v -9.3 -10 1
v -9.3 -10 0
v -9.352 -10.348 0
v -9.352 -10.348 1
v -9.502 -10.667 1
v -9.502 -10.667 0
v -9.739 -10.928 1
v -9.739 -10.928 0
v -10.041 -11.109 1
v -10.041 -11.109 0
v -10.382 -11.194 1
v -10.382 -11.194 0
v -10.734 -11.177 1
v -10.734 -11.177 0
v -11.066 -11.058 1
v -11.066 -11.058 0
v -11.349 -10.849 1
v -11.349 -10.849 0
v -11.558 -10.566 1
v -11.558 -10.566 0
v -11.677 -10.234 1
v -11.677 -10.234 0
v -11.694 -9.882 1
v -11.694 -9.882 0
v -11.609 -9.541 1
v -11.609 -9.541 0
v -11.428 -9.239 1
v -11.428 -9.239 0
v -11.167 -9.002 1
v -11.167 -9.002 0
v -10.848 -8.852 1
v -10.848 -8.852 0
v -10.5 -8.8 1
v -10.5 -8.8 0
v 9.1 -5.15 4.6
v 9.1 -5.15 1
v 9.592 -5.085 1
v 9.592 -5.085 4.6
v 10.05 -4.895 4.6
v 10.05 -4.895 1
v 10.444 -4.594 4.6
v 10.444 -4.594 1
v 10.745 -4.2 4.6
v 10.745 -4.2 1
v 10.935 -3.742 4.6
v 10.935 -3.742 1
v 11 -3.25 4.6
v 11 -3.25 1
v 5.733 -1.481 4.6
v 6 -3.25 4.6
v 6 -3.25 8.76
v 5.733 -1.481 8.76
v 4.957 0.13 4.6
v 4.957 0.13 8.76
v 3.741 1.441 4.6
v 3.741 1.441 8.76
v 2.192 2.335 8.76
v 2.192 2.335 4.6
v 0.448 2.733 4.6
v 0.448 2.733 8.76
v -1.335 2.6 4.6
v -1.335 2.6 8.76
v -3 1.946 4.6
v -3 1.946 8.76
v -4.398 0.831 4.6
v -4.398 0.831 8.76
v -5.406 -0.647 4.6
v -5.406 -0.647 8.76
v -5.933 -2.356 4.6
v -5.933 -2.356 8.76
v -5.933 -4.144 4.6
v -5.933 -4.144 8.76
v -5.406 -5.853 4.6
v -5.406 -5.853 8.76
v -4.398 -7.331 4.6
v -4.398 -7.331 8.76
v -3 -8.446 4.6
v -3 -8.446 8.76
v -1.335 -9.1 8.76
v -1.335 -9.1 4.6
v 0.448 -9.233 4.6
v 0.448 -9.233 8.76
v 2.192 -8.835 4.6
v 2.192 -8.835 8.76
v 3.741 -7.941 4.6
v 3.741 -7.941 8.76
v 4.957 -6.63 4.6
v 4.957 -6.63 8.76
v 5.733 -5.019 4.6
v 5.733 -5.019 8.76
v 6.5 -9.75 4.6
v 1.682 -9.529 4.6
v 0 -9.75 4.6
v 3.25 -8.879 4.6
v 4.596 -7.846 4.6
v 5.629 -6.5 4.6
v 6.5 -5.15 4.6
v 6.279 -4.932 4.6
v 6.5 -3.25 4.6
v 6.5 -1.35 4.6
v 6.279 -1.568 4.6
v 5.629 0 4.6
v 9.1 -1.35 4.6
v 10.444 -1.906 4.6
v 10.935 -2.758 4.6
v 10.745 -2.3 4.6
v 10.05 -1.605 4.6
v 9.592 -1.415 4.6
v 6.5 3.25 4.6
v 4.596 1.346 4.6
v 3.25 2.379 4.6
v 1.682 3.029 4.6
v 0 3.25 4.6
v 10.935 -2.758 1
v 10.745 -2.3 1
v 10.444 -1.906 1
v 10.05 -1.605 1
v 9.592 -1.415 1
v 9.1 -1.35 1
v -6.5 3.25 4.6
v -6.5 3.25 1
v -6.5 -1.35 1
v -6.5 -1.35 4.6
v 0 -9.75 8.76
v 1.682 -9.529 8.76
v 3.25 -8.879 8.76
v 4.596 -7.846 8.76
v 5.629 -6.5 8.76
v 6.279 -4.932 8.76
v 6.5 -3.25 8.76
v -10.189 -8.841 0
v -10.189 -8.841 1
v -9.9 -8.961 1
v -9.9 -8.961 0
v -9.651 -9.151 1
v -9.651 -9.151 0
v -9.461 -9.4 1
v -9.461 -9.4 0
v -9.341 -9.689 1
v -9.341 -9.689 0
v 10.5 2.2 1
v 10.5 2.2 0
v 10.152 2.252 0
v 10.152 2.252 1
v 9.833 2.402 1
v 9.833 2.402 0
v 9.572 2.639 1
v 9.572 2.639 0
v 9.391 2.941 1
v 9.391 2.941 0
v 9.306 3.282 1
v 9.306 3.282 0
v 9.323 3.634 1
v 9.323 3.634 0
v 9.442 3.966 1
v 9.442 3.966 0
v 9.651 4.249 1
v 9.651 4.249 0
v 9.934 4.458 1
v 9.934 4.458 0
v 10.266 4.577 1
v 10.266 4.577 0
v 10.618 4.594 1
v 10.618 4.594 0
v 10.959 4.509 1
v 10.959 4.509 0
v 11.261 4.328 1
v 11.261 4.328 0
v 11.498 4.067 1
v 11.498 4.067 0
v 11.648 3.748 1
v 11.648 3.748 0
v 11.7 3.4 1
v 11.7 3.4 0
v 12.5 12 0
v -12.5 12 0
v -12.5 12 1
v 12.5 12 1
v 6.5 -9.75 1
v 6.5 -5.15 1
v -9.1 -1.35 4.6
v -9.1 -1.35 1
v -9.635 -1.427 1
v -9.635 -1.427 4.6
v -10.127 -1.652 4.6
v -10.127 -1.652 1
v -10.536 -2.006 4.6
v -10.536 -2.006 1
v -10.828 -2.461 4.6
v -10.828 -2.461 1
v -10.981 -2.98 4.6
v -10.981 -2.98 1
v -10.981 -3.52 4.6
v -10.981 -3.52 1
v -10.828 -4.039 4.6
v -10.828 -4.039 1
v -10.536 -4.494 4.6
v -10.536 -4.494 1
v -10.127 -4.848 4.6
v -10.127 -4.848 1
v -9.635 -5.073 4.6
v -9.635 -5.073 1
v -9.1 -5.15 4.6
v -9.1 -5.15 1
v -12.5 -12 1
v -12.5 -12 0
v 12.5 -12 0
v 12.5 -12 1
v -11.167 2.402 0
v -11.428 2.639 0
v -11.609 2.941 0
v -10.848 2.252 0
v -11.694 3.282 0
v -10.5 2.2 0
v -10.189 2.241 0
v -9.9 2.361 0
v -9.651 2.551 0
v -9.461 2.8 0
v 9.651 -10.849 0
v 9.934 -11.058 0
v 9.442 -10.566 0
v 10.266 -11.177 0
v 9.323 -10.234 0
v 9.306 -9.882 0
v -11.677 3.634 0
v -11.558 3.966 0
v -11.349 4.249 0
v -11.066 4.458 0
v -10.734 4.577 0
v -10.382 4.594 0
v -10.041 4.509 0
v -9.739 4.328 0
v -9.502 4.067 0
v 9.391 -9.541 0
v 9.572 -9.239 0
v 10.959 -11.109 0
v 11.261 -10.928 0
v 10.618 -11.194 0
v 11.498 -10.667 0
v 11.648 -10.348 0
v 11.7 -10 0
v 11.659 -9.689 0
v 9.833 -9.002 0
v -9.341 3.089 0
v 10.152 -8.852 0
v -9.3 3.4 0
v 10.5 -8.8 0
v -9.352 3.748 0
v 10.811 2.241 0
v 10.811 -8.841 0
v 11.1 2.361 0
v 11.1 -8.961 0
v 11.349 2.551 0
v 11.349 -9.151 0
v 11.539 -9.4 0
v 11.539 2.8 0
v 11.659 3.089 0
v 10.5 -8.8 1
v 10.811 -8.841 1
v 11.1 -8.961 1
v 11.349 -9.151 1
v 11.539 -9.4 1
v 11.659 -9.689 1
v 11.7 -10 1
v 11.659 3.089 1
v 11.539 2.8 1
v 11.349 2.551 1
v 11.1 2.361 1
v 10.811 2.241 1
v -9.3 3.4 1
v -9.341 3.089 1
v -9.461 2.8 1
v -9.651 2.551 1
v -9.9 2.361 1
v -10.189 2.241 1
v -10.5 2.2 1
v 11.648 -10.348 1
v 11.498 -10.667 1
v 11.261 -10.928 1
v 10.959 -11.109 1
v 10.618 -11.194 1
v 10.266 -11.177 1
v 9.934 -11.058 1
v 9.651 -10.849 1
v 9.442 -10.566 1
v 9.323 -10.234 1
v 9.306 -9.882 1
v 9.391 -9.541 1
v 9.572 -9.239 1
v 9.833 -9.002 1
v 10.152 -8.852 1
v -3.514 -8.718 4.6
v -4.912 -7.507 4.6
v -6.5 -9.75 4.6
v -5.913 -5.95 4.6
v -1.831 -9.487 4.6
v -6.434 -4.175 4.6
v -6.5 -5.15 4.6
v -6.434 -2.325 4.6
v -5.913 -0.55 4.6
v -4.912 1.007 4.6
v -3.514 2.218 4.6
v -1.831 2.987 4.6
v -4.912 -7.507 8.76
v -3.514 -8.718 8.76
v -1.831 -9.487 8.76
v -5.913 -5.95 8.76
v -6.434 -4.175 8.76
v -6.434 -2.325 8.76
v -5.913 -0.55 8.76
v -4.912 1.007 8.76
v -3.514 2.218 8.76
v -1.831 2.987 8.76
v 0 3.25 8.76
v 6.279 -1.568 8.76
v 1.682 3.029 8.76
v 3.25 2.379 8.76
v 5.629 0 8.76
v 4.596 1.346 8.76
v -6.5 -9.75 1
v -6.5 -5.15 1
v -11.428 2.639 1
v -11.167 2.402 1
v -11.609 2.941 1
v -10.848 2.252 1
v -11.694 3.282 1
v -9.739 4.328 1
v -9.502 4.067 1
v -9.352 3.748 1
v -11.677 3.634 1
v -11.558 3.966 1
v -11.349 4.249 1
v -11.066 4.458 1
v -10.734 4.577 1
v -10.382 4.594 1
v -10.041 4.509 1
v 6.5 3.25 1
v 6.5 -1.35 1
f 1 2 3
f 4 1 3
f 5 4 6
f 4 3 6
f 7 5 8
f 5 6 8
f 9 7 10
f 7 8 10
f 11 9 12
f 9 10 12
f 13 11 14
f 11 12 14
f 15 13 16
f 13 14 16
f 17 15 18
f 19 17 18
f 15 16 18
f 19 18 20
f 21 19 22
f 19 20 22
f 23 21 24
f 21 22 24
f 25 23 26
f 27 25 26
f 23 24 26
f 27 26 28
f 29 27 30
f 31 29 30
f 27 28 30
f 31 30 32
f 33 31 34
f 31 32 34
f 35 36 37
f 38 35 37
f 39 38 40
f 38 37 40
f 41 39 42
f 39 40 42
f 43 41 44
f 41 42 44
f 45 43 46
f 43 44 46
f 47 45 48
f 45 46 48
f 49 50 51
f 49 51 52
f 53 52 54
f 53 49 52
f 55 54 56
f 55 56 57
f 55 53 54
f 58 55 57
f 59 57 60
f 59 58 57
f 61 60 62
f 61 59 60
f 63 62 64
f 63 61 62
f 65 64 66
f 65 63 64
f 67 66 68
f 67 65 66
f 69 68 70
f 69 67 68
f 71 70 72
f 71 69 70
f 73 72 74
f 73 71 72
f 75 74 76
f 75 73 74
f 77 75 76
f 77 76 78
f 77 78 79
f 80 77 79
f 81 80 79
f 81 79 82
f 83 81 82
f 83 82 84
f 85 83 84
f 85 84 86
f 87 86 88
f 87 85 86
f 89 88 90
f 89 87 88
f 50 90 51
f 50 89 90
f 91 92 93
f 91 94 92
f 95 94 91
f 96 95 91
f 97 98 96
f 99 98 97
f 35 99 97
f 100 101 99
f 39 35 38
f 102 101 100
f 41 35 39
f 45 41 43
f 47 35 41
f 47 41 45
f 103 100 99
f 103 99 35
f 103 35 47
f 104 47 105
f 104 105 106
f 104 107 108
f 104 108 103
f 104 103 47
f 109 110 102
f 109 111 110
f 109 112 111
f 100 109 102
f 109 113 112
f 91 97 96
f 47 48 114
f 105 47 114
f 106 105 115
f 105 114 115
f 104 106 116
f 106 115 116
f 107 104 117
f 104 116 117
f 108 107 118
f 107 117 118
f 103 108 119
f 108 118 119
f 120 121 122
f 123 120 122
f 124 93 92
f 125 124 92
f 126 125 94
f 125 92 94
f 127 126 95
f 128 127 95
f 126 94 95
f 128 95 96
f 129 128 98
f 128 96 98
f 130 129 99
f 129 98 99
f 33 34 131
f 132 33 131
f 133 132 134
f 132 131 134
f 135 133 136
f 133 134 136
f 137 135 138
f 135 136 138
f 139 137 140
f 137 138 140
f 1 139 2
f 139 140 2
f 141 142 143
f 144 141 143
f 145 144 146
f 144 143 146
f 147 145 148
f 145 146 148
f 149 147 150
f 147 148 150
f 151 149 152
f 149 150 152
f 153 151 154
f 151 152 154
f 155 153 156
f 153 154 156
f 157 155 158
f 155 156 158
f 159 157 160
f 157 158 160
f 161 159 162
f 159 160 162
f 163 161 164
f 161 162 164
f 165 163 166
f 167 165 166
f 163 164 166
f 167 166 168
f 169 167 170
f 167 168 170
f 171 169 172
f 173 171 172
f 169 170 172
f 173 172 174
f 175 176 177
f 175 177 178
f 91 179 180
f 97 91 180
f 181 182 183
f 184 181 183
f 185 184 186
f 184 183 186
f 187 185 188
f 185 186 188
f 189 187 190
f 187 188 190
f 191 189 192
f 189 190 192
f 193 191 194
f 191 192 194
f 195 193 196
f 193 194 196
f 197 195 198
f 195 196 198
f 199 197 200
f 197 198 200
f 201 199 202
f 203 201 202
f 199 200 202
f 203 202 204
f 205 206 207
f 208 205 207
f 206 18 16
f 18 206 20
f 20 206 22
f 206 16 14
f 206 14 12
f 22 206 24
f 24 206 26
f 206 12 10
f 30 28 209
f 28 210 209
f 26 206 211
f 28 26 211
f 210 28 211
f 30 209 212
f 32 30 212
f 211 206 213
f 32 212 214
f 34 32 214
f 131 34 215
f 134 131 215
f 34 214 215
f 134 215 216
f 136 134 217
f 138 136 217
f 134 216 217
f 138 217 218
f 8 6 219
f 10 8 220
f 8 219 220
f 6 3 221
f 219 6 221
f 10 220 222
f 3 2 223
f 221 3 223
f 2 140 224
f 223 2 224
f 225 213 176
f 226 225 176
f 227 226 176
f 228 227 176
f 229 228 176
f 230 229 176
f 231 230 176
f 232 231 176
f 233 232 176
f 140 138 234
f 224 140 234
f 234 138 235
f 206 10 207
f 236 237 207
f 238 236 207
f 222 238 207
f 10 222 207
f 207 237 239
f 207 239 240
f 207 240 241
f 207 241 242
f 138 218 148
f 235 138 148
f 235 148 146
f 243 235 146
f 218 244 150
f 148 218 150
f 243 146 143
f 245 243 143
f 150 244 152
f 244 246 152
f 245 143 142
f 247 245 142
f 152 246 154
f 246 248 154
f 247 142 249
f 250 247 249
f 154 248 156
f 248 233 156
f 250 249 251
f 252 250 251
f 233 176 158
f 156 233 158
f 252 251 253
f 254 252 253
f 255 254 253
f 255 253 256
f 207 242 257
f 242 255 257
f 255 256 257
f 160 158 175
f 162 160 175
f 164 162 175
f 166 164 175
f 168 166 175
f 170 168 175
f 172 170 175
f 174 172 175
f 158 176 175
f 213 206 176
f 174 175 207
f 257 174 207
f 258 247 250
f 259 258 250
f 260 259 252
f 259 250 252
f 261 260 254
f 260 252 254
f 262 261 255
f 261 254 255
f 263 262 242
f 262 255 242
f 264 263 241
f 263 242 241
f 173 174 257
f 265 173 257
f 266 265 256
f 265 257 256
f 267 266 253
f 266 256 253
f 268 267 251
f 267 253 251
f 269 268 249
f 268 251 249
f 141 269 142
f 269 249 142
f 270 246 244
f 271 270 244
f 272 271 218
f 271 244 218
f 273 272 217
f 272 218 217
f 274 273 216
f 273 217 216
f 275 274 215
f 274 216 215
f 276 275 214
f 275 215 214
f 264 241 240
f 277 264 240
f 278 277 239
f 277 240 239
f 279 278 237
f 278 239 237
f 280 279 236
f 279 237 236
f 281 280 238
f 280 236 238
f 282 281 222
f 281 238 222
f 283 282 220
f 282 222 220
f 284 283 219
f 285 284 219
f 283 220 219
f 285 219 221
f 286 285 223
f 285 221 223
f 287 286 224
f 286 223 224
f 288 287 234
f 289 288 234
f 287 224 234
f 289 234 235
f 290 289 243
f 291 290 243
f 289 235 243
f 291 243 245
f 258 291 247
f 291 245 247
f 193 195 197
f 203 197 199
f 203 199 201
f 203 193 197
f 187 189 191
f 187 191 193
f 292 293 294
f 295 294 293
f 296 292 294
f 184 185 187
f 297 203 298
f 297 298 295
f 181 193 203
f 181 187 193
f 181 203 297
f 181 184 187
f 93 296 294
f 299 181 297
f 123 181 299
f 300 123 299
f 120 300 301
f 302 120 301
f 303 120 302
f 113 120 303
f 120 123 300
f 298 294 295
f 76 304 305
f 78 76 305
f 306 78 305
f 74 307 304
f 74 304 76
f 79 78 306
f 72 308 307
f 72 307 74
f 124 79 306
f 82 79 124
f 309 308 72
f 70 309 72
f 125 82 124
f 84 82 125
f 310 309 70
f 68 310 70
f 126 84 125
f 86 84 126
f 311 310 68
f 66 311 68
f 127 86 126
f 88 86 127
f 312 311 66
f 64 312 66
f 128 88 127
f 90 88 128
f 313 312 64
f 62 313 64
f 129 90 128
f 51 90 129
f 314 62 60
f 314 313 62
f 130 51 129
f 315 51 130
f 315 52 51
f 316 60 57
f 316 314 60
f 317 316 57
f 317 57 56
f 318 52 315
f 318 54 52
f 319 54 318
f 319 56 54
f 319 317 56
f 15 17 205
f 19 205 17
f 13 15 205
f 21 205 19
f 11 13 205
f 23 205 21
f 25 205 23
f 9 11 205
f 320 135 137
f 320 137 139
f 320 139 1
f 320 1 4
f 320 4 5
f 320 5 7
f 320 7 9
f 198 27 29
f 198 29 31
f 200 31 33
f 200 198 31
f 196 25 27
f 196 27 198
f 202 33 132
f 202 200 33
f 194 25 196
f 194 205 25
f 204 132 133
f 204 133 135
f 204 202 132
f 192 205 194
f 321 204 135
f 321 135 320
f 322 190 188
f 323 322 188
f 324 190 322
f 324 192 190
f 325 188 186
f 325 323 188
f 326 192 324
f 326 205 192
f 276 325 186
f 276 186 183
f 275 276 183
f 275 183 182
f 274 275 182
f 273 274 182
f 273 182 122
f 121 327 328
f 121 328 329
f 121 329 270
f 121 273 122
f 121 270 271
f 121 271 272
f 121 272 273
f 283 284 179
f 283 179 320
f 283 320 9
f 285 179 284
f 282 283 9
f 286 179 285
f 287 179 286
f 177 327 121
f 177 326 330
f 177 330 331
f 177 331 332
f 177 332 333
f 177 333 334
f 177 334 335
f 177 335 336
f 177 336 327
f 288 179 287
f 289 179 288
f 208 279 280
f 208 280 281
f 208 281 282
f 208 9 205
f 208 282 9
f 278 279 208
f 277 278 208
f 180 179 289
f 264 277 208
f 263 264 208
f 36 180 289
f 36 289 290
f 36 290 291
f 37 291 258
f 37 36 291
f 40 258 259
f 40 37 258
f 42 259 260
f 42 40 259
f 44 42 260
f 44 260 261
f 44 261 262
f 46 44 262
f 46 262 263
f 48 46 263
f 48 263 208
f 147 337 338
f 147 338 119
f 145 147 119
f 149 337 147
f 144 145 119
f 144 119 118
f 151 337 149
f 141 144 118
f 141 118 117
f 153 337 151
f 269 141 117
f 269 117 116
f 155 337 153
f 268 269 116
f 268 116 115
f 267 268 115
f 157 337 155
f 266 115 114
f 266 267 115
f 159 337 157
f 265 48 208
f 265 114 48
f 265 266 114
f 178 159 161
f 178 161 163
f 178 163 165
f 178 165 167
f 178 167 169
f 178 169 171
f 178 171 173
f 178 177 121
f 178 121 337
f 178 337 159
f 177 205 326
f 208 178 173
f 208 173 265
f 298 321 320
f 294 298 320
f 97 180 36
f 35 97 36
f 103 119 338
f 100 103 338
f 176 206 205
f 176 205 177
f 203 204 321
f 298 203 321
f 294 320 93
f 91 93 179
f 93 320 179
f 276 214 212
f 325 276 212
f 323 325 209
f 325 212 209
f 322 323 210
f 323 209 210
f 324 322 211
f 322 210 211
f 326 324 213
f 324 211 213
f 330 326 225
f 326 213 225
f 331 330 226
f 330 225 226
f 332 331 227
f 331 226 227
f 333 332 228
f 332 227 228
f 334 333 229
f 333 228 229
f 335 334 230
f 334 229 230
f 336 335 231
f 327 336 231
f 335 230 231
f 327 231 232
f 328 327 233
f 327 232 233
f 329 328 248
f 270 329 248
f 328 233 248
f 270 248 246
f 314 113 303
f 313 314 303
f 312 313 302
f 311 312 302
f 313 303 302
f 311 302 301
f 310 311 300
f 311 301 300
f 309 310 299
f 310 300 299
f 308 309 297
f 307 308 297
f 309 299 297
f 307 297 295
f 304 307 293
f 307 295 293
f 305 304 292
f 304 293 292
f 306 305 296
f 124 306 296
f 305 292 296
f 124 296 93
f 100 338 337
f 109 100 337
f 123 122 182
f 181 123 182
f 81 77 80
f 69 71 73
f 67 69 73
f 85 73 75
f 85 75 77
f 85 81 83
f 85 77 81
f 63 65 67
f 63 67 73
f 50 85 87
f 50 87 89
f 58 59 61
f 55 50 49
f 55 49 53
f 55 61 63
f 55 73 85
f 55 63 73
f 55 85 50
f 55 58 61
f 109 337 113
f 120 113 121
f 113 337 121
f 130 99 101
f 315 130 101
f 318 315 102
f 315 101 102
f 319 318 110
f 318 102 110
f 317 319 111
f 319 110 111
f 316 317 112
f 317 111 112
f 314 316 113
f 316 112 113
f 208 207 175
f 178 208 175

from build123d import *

# Parameters (mm, degrees)
F0_W     = 25
F0_H     = 24
F1_DEPTH = 1
F3_DEPTH = 3.6
F4_R     = 6
F5_DEPTH = 4.16


with BuildPart() as f1:
    # F0 (on Top) → F1 (new body)
    with BuildSketch(Plane.XY):
        Rectangle(F0_W, F0_H)
        with BuildLine():
            ThreePointArc((-9.3, -10), (-11.348528, -10.848528), (-10.5, -8.8))
            ThreePointArc((-10.5, -8.8), (-9.651472, -9.151472), (-9.3, -10))
        make_face(mode=Mode.SUBTRACT)
        with BuildLine():
            ThreePointArc((10.5, -8.8), (11.348528, -9.151472), (11.7, -10))
            ThreePointArc((11.7, -10), (9.651472, -10.848528), (10.5, -8.8))
        make_face(mode=Mode.SUBTRACT)
        with BuildLine():
            ThreePointArc((-10.5, 2.2), (-11.348528, 4.248528), (-9.3, 3.4))
            ThreePointArc((-9.3, 3.4), (-9.651472, 2.551472), (-10.5, 2.2))
        make_face(mode=Mode.SUBTRACT)
        with BuildLine():
            ThreePointArc((11.7, 3.4), (11.348528, 2.551472), (10.5, 2.2))
            ThreePointArc((10.5, 2.2), (9.651472, 4.248528), (11.7, 3.4))
        make_face(mode=Mode.SUBTRACT)
    extrude(amount=F1_DEPTH)

    # F2 (on face) → F3 (join)
    with BuildSketch(Plane.XY.offset(1)):
        Polygon((6.5, 3.25), (-6.5, 3.25), (-6.5, -1.35), (-6.5, -5.15), (-6.5, -9.75), (6.5, -9.75), (6.5, -5.15), (6.5, -1.35), align=None)
        with BuildLine():
            Line((-6.5, -5.15), (-6.5, -1.35))
            Line((-6.5, -1.35), (-9.1, -1.35))
            ThreePointArc((-9.1, -1.35), (-7.756497, -1.906497), (-7.2, -3.25))
            ThreePointArc((-7.2, -3.25), (-7.756497, -4.593503), (-9.1, -5.15))
            Line((-9.1, -5.15), (-6.5, -5.15))
        make_face()
        with BuildLine():
            ThreePointArc((-7.2, -3.25), (-7.756497, -1.906497), (-9.1, -1.35))
            ThreePointArc((-9.1, -1.35), (-11, -3.25), (-9.1, -5.15))
            ThreePointArc((-9.1, -5.15), (-7.756497, -4.593503), (-7.2, -3.25))
        make_face()
        with BuildLine():
            Line((9.1, -1.35), (6.5, -1.35))
            Line((6.5, -1.35), (6.5, -5.15))
            Line((6.5, -5.15), (9.1, -5.15))
            ThreePointArc((9.1, -5.15), (7.2, -3.25), (9.1, -1.35))
        make_face()
        with BuildLine():
            ThreePointArc((11, -3.25), (10.443503, -1.906497), (9.1, -1.35))
            ThreePointArc((9.1, -1.35), (7.2, -3.25), (9.1, -5.15))
            ThreePointArc((9.1, -5.15), (10.443503, -4.593503), (11, -3.25))
        make_face()
    extrude(amount=F3_DEPTH)

    # F4 (on face) → F5 (join)
    with BuildSketch(Plane.XY.offset(4.6)):
        with BuildLine():
            ThreePointArc((0, -9.75), (4.596194, -7.846194), (6.5, -3.25))
            ThreePointArc((6.5, -3.25), (4.596194, 1.346194), (0, 3.25))
            ThreePointArc((0, 3.25), (-6.5, -3.25), (0, -9.75))
        make_face()
        with Locations((0, -3.25)):
            Circle(F4_R, mode=Mode.SUBTRACT)
    extrude(amount=F5_DEPTH)


solid = f1.part
